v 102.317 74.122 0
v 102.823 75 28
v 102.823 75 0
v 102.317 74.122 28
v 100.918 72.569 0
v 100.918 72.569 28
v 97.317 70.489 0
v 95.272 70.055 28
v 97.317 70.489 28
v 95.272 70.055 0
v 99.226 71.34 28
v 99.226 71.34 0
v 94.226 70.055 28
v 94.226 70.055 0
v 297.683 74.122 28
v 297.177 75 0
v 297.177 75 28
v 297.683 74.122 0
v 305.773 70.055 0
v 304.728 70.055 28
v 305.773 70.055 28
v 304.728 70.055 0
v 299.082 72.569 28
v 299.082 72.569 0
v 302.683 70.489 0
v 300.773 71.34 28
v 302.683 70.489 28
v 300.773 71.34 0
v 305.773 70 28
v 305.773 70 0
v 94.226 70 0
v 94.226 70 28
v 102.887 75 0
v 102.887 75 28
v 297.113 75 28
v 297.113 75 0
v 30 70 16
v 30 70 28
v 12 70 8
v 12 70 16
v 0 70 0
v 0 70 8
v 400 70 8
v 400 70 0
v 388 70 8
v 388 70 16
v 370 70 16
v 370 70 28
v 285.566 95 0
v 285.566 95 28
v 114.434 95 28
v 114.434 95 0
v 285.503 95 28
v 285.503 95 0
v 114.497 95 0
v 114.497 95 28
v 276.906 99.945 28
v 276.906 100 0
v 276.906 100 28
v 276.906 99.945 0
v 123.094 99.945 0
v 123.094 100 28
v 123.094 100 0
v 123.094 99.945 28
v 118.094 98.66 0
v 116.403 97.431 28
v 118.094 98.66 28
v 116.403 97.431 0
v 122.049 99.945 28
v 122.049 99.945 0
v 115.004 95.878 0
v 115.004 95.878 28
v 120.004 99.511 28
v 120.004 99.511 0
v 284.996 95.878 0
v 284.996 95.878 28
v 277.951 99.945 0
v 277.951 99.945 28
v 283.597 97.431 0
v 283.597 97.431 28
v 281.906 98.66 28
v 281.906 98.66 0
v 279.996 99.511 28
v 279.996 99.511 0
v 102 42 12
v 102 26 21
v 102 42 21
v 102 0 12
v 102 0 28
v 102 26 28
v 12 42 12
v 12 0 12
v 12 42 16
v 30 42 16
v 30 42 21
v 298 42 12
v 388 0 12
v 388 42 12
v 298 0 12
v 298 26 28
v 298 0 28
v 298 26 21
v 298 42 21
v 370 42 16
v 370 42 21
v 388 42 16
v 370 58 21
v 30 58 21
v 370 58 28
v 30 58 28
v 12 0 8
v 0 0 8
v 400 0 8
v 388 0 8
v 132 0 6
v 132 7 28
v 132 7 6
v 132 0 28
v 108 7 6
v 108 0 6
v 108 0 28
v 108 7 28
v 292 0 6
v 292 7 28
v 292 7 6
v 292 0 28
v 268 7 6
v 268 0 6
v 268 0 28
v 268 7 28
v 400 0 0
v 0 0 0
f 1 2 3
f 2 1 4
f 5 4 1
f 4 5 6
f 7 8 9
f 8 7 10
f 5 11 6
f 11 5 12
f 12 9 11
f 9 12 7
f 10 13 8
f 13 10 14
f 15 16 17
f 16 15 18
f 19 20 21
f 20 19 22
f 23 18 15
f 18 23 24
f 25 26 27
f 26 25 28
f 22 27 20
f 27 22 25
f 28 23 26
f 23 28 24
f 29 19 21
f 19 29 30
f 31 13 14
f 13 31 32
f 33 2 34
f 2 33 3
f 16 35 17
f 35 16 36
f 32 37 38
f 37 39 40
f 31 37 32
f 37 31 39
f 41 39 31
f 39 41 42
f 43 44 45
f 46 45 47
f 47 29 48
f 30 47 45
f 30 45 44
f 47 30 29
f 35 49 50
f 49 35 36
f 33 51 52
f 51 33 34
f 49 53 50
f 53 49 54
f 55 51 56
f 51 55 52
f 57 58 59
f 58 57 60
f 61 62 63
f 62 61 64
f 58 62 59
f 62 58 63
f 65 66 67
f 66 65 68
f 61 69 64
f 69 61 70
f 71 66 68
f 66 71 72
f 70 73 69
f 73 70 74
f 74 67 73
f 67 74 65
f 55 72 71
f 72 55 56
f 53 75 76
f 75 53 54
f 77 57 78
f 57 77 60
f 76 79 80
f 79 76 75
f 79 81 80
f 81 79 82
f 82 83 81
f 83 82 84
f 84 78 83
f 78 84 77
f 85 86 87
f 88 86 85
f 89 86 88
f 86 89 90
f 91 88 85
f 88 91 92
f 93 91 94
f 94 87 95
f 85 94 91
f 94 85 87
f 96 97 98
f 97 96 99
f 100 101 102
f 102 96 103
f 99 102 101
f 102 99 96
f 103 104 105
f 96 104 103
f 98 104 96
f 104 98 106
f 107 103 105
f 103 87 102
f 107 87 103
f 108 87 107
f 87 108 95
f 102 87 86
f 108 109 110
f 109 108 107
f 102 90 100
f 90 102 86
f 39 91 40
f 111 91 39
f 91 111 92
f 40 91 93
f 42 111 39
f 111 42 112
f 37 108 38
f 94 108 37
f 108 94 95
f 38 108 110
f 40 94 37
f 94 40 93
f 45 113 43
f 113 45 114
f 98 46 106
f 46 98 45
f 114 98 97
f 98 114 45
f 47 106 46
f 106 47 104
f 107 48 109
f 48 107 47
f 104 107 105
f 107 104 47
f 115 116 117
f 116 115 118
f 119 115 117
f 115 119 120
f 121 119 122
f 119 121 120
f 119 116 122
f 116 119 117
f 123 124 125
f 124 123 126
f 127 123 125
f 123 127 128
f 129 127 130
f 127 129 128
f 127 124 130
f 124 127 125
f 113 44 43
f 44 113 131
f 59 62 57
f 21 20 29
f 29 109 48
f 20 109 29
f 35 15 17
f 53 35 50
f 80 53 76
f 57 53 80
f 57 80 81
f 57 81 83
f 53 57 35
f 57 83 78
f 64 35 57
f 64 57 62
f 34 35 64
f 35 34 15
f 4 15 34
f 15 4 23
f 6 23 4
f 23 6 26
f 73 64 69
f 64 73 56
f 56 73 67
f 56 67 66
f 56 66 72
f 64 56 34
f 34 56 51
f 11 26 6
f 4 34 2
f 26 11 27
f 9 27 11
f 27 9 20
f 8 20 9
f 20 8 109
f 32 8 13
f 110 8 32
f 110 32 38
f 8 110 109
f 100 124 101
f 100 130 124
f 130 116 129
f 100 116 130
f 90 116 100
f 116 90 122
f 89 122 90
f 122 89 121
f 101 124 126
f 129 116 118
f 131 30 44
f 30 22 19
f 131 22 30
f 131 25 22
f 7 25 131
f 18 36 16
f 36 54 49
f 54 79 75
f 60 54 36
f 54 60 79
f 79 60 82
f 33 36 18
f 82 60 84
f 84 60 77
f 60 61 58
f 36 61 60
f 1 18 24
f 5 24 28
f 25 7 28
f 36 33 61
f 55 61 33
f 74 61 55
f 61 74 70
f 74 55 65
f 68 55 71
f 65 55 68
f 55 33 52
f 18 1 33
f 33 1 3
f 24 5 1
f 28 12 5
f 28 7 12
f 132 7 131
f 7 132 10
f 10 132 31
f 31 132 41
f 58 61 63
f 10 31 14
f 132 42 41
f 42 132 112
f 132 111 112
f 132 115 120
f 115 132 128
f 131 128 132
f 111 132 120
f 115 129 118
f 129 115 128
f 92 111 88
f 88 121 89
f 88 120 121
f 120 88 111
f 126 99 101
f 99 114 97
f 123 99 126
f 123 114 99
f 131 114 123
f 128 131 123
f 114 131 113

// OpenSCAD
include <../src/wardrobe.scad>;
plank_xz_front_top(wardrobe_n);
//github_openscad -o wardrobe_2/plank_xz_front_top.stl -D wardrobe_n=2 -D cutting_edge=0 -D break_view_length=0 wardrobe_2/plank_xz_front_top_stl.scad
